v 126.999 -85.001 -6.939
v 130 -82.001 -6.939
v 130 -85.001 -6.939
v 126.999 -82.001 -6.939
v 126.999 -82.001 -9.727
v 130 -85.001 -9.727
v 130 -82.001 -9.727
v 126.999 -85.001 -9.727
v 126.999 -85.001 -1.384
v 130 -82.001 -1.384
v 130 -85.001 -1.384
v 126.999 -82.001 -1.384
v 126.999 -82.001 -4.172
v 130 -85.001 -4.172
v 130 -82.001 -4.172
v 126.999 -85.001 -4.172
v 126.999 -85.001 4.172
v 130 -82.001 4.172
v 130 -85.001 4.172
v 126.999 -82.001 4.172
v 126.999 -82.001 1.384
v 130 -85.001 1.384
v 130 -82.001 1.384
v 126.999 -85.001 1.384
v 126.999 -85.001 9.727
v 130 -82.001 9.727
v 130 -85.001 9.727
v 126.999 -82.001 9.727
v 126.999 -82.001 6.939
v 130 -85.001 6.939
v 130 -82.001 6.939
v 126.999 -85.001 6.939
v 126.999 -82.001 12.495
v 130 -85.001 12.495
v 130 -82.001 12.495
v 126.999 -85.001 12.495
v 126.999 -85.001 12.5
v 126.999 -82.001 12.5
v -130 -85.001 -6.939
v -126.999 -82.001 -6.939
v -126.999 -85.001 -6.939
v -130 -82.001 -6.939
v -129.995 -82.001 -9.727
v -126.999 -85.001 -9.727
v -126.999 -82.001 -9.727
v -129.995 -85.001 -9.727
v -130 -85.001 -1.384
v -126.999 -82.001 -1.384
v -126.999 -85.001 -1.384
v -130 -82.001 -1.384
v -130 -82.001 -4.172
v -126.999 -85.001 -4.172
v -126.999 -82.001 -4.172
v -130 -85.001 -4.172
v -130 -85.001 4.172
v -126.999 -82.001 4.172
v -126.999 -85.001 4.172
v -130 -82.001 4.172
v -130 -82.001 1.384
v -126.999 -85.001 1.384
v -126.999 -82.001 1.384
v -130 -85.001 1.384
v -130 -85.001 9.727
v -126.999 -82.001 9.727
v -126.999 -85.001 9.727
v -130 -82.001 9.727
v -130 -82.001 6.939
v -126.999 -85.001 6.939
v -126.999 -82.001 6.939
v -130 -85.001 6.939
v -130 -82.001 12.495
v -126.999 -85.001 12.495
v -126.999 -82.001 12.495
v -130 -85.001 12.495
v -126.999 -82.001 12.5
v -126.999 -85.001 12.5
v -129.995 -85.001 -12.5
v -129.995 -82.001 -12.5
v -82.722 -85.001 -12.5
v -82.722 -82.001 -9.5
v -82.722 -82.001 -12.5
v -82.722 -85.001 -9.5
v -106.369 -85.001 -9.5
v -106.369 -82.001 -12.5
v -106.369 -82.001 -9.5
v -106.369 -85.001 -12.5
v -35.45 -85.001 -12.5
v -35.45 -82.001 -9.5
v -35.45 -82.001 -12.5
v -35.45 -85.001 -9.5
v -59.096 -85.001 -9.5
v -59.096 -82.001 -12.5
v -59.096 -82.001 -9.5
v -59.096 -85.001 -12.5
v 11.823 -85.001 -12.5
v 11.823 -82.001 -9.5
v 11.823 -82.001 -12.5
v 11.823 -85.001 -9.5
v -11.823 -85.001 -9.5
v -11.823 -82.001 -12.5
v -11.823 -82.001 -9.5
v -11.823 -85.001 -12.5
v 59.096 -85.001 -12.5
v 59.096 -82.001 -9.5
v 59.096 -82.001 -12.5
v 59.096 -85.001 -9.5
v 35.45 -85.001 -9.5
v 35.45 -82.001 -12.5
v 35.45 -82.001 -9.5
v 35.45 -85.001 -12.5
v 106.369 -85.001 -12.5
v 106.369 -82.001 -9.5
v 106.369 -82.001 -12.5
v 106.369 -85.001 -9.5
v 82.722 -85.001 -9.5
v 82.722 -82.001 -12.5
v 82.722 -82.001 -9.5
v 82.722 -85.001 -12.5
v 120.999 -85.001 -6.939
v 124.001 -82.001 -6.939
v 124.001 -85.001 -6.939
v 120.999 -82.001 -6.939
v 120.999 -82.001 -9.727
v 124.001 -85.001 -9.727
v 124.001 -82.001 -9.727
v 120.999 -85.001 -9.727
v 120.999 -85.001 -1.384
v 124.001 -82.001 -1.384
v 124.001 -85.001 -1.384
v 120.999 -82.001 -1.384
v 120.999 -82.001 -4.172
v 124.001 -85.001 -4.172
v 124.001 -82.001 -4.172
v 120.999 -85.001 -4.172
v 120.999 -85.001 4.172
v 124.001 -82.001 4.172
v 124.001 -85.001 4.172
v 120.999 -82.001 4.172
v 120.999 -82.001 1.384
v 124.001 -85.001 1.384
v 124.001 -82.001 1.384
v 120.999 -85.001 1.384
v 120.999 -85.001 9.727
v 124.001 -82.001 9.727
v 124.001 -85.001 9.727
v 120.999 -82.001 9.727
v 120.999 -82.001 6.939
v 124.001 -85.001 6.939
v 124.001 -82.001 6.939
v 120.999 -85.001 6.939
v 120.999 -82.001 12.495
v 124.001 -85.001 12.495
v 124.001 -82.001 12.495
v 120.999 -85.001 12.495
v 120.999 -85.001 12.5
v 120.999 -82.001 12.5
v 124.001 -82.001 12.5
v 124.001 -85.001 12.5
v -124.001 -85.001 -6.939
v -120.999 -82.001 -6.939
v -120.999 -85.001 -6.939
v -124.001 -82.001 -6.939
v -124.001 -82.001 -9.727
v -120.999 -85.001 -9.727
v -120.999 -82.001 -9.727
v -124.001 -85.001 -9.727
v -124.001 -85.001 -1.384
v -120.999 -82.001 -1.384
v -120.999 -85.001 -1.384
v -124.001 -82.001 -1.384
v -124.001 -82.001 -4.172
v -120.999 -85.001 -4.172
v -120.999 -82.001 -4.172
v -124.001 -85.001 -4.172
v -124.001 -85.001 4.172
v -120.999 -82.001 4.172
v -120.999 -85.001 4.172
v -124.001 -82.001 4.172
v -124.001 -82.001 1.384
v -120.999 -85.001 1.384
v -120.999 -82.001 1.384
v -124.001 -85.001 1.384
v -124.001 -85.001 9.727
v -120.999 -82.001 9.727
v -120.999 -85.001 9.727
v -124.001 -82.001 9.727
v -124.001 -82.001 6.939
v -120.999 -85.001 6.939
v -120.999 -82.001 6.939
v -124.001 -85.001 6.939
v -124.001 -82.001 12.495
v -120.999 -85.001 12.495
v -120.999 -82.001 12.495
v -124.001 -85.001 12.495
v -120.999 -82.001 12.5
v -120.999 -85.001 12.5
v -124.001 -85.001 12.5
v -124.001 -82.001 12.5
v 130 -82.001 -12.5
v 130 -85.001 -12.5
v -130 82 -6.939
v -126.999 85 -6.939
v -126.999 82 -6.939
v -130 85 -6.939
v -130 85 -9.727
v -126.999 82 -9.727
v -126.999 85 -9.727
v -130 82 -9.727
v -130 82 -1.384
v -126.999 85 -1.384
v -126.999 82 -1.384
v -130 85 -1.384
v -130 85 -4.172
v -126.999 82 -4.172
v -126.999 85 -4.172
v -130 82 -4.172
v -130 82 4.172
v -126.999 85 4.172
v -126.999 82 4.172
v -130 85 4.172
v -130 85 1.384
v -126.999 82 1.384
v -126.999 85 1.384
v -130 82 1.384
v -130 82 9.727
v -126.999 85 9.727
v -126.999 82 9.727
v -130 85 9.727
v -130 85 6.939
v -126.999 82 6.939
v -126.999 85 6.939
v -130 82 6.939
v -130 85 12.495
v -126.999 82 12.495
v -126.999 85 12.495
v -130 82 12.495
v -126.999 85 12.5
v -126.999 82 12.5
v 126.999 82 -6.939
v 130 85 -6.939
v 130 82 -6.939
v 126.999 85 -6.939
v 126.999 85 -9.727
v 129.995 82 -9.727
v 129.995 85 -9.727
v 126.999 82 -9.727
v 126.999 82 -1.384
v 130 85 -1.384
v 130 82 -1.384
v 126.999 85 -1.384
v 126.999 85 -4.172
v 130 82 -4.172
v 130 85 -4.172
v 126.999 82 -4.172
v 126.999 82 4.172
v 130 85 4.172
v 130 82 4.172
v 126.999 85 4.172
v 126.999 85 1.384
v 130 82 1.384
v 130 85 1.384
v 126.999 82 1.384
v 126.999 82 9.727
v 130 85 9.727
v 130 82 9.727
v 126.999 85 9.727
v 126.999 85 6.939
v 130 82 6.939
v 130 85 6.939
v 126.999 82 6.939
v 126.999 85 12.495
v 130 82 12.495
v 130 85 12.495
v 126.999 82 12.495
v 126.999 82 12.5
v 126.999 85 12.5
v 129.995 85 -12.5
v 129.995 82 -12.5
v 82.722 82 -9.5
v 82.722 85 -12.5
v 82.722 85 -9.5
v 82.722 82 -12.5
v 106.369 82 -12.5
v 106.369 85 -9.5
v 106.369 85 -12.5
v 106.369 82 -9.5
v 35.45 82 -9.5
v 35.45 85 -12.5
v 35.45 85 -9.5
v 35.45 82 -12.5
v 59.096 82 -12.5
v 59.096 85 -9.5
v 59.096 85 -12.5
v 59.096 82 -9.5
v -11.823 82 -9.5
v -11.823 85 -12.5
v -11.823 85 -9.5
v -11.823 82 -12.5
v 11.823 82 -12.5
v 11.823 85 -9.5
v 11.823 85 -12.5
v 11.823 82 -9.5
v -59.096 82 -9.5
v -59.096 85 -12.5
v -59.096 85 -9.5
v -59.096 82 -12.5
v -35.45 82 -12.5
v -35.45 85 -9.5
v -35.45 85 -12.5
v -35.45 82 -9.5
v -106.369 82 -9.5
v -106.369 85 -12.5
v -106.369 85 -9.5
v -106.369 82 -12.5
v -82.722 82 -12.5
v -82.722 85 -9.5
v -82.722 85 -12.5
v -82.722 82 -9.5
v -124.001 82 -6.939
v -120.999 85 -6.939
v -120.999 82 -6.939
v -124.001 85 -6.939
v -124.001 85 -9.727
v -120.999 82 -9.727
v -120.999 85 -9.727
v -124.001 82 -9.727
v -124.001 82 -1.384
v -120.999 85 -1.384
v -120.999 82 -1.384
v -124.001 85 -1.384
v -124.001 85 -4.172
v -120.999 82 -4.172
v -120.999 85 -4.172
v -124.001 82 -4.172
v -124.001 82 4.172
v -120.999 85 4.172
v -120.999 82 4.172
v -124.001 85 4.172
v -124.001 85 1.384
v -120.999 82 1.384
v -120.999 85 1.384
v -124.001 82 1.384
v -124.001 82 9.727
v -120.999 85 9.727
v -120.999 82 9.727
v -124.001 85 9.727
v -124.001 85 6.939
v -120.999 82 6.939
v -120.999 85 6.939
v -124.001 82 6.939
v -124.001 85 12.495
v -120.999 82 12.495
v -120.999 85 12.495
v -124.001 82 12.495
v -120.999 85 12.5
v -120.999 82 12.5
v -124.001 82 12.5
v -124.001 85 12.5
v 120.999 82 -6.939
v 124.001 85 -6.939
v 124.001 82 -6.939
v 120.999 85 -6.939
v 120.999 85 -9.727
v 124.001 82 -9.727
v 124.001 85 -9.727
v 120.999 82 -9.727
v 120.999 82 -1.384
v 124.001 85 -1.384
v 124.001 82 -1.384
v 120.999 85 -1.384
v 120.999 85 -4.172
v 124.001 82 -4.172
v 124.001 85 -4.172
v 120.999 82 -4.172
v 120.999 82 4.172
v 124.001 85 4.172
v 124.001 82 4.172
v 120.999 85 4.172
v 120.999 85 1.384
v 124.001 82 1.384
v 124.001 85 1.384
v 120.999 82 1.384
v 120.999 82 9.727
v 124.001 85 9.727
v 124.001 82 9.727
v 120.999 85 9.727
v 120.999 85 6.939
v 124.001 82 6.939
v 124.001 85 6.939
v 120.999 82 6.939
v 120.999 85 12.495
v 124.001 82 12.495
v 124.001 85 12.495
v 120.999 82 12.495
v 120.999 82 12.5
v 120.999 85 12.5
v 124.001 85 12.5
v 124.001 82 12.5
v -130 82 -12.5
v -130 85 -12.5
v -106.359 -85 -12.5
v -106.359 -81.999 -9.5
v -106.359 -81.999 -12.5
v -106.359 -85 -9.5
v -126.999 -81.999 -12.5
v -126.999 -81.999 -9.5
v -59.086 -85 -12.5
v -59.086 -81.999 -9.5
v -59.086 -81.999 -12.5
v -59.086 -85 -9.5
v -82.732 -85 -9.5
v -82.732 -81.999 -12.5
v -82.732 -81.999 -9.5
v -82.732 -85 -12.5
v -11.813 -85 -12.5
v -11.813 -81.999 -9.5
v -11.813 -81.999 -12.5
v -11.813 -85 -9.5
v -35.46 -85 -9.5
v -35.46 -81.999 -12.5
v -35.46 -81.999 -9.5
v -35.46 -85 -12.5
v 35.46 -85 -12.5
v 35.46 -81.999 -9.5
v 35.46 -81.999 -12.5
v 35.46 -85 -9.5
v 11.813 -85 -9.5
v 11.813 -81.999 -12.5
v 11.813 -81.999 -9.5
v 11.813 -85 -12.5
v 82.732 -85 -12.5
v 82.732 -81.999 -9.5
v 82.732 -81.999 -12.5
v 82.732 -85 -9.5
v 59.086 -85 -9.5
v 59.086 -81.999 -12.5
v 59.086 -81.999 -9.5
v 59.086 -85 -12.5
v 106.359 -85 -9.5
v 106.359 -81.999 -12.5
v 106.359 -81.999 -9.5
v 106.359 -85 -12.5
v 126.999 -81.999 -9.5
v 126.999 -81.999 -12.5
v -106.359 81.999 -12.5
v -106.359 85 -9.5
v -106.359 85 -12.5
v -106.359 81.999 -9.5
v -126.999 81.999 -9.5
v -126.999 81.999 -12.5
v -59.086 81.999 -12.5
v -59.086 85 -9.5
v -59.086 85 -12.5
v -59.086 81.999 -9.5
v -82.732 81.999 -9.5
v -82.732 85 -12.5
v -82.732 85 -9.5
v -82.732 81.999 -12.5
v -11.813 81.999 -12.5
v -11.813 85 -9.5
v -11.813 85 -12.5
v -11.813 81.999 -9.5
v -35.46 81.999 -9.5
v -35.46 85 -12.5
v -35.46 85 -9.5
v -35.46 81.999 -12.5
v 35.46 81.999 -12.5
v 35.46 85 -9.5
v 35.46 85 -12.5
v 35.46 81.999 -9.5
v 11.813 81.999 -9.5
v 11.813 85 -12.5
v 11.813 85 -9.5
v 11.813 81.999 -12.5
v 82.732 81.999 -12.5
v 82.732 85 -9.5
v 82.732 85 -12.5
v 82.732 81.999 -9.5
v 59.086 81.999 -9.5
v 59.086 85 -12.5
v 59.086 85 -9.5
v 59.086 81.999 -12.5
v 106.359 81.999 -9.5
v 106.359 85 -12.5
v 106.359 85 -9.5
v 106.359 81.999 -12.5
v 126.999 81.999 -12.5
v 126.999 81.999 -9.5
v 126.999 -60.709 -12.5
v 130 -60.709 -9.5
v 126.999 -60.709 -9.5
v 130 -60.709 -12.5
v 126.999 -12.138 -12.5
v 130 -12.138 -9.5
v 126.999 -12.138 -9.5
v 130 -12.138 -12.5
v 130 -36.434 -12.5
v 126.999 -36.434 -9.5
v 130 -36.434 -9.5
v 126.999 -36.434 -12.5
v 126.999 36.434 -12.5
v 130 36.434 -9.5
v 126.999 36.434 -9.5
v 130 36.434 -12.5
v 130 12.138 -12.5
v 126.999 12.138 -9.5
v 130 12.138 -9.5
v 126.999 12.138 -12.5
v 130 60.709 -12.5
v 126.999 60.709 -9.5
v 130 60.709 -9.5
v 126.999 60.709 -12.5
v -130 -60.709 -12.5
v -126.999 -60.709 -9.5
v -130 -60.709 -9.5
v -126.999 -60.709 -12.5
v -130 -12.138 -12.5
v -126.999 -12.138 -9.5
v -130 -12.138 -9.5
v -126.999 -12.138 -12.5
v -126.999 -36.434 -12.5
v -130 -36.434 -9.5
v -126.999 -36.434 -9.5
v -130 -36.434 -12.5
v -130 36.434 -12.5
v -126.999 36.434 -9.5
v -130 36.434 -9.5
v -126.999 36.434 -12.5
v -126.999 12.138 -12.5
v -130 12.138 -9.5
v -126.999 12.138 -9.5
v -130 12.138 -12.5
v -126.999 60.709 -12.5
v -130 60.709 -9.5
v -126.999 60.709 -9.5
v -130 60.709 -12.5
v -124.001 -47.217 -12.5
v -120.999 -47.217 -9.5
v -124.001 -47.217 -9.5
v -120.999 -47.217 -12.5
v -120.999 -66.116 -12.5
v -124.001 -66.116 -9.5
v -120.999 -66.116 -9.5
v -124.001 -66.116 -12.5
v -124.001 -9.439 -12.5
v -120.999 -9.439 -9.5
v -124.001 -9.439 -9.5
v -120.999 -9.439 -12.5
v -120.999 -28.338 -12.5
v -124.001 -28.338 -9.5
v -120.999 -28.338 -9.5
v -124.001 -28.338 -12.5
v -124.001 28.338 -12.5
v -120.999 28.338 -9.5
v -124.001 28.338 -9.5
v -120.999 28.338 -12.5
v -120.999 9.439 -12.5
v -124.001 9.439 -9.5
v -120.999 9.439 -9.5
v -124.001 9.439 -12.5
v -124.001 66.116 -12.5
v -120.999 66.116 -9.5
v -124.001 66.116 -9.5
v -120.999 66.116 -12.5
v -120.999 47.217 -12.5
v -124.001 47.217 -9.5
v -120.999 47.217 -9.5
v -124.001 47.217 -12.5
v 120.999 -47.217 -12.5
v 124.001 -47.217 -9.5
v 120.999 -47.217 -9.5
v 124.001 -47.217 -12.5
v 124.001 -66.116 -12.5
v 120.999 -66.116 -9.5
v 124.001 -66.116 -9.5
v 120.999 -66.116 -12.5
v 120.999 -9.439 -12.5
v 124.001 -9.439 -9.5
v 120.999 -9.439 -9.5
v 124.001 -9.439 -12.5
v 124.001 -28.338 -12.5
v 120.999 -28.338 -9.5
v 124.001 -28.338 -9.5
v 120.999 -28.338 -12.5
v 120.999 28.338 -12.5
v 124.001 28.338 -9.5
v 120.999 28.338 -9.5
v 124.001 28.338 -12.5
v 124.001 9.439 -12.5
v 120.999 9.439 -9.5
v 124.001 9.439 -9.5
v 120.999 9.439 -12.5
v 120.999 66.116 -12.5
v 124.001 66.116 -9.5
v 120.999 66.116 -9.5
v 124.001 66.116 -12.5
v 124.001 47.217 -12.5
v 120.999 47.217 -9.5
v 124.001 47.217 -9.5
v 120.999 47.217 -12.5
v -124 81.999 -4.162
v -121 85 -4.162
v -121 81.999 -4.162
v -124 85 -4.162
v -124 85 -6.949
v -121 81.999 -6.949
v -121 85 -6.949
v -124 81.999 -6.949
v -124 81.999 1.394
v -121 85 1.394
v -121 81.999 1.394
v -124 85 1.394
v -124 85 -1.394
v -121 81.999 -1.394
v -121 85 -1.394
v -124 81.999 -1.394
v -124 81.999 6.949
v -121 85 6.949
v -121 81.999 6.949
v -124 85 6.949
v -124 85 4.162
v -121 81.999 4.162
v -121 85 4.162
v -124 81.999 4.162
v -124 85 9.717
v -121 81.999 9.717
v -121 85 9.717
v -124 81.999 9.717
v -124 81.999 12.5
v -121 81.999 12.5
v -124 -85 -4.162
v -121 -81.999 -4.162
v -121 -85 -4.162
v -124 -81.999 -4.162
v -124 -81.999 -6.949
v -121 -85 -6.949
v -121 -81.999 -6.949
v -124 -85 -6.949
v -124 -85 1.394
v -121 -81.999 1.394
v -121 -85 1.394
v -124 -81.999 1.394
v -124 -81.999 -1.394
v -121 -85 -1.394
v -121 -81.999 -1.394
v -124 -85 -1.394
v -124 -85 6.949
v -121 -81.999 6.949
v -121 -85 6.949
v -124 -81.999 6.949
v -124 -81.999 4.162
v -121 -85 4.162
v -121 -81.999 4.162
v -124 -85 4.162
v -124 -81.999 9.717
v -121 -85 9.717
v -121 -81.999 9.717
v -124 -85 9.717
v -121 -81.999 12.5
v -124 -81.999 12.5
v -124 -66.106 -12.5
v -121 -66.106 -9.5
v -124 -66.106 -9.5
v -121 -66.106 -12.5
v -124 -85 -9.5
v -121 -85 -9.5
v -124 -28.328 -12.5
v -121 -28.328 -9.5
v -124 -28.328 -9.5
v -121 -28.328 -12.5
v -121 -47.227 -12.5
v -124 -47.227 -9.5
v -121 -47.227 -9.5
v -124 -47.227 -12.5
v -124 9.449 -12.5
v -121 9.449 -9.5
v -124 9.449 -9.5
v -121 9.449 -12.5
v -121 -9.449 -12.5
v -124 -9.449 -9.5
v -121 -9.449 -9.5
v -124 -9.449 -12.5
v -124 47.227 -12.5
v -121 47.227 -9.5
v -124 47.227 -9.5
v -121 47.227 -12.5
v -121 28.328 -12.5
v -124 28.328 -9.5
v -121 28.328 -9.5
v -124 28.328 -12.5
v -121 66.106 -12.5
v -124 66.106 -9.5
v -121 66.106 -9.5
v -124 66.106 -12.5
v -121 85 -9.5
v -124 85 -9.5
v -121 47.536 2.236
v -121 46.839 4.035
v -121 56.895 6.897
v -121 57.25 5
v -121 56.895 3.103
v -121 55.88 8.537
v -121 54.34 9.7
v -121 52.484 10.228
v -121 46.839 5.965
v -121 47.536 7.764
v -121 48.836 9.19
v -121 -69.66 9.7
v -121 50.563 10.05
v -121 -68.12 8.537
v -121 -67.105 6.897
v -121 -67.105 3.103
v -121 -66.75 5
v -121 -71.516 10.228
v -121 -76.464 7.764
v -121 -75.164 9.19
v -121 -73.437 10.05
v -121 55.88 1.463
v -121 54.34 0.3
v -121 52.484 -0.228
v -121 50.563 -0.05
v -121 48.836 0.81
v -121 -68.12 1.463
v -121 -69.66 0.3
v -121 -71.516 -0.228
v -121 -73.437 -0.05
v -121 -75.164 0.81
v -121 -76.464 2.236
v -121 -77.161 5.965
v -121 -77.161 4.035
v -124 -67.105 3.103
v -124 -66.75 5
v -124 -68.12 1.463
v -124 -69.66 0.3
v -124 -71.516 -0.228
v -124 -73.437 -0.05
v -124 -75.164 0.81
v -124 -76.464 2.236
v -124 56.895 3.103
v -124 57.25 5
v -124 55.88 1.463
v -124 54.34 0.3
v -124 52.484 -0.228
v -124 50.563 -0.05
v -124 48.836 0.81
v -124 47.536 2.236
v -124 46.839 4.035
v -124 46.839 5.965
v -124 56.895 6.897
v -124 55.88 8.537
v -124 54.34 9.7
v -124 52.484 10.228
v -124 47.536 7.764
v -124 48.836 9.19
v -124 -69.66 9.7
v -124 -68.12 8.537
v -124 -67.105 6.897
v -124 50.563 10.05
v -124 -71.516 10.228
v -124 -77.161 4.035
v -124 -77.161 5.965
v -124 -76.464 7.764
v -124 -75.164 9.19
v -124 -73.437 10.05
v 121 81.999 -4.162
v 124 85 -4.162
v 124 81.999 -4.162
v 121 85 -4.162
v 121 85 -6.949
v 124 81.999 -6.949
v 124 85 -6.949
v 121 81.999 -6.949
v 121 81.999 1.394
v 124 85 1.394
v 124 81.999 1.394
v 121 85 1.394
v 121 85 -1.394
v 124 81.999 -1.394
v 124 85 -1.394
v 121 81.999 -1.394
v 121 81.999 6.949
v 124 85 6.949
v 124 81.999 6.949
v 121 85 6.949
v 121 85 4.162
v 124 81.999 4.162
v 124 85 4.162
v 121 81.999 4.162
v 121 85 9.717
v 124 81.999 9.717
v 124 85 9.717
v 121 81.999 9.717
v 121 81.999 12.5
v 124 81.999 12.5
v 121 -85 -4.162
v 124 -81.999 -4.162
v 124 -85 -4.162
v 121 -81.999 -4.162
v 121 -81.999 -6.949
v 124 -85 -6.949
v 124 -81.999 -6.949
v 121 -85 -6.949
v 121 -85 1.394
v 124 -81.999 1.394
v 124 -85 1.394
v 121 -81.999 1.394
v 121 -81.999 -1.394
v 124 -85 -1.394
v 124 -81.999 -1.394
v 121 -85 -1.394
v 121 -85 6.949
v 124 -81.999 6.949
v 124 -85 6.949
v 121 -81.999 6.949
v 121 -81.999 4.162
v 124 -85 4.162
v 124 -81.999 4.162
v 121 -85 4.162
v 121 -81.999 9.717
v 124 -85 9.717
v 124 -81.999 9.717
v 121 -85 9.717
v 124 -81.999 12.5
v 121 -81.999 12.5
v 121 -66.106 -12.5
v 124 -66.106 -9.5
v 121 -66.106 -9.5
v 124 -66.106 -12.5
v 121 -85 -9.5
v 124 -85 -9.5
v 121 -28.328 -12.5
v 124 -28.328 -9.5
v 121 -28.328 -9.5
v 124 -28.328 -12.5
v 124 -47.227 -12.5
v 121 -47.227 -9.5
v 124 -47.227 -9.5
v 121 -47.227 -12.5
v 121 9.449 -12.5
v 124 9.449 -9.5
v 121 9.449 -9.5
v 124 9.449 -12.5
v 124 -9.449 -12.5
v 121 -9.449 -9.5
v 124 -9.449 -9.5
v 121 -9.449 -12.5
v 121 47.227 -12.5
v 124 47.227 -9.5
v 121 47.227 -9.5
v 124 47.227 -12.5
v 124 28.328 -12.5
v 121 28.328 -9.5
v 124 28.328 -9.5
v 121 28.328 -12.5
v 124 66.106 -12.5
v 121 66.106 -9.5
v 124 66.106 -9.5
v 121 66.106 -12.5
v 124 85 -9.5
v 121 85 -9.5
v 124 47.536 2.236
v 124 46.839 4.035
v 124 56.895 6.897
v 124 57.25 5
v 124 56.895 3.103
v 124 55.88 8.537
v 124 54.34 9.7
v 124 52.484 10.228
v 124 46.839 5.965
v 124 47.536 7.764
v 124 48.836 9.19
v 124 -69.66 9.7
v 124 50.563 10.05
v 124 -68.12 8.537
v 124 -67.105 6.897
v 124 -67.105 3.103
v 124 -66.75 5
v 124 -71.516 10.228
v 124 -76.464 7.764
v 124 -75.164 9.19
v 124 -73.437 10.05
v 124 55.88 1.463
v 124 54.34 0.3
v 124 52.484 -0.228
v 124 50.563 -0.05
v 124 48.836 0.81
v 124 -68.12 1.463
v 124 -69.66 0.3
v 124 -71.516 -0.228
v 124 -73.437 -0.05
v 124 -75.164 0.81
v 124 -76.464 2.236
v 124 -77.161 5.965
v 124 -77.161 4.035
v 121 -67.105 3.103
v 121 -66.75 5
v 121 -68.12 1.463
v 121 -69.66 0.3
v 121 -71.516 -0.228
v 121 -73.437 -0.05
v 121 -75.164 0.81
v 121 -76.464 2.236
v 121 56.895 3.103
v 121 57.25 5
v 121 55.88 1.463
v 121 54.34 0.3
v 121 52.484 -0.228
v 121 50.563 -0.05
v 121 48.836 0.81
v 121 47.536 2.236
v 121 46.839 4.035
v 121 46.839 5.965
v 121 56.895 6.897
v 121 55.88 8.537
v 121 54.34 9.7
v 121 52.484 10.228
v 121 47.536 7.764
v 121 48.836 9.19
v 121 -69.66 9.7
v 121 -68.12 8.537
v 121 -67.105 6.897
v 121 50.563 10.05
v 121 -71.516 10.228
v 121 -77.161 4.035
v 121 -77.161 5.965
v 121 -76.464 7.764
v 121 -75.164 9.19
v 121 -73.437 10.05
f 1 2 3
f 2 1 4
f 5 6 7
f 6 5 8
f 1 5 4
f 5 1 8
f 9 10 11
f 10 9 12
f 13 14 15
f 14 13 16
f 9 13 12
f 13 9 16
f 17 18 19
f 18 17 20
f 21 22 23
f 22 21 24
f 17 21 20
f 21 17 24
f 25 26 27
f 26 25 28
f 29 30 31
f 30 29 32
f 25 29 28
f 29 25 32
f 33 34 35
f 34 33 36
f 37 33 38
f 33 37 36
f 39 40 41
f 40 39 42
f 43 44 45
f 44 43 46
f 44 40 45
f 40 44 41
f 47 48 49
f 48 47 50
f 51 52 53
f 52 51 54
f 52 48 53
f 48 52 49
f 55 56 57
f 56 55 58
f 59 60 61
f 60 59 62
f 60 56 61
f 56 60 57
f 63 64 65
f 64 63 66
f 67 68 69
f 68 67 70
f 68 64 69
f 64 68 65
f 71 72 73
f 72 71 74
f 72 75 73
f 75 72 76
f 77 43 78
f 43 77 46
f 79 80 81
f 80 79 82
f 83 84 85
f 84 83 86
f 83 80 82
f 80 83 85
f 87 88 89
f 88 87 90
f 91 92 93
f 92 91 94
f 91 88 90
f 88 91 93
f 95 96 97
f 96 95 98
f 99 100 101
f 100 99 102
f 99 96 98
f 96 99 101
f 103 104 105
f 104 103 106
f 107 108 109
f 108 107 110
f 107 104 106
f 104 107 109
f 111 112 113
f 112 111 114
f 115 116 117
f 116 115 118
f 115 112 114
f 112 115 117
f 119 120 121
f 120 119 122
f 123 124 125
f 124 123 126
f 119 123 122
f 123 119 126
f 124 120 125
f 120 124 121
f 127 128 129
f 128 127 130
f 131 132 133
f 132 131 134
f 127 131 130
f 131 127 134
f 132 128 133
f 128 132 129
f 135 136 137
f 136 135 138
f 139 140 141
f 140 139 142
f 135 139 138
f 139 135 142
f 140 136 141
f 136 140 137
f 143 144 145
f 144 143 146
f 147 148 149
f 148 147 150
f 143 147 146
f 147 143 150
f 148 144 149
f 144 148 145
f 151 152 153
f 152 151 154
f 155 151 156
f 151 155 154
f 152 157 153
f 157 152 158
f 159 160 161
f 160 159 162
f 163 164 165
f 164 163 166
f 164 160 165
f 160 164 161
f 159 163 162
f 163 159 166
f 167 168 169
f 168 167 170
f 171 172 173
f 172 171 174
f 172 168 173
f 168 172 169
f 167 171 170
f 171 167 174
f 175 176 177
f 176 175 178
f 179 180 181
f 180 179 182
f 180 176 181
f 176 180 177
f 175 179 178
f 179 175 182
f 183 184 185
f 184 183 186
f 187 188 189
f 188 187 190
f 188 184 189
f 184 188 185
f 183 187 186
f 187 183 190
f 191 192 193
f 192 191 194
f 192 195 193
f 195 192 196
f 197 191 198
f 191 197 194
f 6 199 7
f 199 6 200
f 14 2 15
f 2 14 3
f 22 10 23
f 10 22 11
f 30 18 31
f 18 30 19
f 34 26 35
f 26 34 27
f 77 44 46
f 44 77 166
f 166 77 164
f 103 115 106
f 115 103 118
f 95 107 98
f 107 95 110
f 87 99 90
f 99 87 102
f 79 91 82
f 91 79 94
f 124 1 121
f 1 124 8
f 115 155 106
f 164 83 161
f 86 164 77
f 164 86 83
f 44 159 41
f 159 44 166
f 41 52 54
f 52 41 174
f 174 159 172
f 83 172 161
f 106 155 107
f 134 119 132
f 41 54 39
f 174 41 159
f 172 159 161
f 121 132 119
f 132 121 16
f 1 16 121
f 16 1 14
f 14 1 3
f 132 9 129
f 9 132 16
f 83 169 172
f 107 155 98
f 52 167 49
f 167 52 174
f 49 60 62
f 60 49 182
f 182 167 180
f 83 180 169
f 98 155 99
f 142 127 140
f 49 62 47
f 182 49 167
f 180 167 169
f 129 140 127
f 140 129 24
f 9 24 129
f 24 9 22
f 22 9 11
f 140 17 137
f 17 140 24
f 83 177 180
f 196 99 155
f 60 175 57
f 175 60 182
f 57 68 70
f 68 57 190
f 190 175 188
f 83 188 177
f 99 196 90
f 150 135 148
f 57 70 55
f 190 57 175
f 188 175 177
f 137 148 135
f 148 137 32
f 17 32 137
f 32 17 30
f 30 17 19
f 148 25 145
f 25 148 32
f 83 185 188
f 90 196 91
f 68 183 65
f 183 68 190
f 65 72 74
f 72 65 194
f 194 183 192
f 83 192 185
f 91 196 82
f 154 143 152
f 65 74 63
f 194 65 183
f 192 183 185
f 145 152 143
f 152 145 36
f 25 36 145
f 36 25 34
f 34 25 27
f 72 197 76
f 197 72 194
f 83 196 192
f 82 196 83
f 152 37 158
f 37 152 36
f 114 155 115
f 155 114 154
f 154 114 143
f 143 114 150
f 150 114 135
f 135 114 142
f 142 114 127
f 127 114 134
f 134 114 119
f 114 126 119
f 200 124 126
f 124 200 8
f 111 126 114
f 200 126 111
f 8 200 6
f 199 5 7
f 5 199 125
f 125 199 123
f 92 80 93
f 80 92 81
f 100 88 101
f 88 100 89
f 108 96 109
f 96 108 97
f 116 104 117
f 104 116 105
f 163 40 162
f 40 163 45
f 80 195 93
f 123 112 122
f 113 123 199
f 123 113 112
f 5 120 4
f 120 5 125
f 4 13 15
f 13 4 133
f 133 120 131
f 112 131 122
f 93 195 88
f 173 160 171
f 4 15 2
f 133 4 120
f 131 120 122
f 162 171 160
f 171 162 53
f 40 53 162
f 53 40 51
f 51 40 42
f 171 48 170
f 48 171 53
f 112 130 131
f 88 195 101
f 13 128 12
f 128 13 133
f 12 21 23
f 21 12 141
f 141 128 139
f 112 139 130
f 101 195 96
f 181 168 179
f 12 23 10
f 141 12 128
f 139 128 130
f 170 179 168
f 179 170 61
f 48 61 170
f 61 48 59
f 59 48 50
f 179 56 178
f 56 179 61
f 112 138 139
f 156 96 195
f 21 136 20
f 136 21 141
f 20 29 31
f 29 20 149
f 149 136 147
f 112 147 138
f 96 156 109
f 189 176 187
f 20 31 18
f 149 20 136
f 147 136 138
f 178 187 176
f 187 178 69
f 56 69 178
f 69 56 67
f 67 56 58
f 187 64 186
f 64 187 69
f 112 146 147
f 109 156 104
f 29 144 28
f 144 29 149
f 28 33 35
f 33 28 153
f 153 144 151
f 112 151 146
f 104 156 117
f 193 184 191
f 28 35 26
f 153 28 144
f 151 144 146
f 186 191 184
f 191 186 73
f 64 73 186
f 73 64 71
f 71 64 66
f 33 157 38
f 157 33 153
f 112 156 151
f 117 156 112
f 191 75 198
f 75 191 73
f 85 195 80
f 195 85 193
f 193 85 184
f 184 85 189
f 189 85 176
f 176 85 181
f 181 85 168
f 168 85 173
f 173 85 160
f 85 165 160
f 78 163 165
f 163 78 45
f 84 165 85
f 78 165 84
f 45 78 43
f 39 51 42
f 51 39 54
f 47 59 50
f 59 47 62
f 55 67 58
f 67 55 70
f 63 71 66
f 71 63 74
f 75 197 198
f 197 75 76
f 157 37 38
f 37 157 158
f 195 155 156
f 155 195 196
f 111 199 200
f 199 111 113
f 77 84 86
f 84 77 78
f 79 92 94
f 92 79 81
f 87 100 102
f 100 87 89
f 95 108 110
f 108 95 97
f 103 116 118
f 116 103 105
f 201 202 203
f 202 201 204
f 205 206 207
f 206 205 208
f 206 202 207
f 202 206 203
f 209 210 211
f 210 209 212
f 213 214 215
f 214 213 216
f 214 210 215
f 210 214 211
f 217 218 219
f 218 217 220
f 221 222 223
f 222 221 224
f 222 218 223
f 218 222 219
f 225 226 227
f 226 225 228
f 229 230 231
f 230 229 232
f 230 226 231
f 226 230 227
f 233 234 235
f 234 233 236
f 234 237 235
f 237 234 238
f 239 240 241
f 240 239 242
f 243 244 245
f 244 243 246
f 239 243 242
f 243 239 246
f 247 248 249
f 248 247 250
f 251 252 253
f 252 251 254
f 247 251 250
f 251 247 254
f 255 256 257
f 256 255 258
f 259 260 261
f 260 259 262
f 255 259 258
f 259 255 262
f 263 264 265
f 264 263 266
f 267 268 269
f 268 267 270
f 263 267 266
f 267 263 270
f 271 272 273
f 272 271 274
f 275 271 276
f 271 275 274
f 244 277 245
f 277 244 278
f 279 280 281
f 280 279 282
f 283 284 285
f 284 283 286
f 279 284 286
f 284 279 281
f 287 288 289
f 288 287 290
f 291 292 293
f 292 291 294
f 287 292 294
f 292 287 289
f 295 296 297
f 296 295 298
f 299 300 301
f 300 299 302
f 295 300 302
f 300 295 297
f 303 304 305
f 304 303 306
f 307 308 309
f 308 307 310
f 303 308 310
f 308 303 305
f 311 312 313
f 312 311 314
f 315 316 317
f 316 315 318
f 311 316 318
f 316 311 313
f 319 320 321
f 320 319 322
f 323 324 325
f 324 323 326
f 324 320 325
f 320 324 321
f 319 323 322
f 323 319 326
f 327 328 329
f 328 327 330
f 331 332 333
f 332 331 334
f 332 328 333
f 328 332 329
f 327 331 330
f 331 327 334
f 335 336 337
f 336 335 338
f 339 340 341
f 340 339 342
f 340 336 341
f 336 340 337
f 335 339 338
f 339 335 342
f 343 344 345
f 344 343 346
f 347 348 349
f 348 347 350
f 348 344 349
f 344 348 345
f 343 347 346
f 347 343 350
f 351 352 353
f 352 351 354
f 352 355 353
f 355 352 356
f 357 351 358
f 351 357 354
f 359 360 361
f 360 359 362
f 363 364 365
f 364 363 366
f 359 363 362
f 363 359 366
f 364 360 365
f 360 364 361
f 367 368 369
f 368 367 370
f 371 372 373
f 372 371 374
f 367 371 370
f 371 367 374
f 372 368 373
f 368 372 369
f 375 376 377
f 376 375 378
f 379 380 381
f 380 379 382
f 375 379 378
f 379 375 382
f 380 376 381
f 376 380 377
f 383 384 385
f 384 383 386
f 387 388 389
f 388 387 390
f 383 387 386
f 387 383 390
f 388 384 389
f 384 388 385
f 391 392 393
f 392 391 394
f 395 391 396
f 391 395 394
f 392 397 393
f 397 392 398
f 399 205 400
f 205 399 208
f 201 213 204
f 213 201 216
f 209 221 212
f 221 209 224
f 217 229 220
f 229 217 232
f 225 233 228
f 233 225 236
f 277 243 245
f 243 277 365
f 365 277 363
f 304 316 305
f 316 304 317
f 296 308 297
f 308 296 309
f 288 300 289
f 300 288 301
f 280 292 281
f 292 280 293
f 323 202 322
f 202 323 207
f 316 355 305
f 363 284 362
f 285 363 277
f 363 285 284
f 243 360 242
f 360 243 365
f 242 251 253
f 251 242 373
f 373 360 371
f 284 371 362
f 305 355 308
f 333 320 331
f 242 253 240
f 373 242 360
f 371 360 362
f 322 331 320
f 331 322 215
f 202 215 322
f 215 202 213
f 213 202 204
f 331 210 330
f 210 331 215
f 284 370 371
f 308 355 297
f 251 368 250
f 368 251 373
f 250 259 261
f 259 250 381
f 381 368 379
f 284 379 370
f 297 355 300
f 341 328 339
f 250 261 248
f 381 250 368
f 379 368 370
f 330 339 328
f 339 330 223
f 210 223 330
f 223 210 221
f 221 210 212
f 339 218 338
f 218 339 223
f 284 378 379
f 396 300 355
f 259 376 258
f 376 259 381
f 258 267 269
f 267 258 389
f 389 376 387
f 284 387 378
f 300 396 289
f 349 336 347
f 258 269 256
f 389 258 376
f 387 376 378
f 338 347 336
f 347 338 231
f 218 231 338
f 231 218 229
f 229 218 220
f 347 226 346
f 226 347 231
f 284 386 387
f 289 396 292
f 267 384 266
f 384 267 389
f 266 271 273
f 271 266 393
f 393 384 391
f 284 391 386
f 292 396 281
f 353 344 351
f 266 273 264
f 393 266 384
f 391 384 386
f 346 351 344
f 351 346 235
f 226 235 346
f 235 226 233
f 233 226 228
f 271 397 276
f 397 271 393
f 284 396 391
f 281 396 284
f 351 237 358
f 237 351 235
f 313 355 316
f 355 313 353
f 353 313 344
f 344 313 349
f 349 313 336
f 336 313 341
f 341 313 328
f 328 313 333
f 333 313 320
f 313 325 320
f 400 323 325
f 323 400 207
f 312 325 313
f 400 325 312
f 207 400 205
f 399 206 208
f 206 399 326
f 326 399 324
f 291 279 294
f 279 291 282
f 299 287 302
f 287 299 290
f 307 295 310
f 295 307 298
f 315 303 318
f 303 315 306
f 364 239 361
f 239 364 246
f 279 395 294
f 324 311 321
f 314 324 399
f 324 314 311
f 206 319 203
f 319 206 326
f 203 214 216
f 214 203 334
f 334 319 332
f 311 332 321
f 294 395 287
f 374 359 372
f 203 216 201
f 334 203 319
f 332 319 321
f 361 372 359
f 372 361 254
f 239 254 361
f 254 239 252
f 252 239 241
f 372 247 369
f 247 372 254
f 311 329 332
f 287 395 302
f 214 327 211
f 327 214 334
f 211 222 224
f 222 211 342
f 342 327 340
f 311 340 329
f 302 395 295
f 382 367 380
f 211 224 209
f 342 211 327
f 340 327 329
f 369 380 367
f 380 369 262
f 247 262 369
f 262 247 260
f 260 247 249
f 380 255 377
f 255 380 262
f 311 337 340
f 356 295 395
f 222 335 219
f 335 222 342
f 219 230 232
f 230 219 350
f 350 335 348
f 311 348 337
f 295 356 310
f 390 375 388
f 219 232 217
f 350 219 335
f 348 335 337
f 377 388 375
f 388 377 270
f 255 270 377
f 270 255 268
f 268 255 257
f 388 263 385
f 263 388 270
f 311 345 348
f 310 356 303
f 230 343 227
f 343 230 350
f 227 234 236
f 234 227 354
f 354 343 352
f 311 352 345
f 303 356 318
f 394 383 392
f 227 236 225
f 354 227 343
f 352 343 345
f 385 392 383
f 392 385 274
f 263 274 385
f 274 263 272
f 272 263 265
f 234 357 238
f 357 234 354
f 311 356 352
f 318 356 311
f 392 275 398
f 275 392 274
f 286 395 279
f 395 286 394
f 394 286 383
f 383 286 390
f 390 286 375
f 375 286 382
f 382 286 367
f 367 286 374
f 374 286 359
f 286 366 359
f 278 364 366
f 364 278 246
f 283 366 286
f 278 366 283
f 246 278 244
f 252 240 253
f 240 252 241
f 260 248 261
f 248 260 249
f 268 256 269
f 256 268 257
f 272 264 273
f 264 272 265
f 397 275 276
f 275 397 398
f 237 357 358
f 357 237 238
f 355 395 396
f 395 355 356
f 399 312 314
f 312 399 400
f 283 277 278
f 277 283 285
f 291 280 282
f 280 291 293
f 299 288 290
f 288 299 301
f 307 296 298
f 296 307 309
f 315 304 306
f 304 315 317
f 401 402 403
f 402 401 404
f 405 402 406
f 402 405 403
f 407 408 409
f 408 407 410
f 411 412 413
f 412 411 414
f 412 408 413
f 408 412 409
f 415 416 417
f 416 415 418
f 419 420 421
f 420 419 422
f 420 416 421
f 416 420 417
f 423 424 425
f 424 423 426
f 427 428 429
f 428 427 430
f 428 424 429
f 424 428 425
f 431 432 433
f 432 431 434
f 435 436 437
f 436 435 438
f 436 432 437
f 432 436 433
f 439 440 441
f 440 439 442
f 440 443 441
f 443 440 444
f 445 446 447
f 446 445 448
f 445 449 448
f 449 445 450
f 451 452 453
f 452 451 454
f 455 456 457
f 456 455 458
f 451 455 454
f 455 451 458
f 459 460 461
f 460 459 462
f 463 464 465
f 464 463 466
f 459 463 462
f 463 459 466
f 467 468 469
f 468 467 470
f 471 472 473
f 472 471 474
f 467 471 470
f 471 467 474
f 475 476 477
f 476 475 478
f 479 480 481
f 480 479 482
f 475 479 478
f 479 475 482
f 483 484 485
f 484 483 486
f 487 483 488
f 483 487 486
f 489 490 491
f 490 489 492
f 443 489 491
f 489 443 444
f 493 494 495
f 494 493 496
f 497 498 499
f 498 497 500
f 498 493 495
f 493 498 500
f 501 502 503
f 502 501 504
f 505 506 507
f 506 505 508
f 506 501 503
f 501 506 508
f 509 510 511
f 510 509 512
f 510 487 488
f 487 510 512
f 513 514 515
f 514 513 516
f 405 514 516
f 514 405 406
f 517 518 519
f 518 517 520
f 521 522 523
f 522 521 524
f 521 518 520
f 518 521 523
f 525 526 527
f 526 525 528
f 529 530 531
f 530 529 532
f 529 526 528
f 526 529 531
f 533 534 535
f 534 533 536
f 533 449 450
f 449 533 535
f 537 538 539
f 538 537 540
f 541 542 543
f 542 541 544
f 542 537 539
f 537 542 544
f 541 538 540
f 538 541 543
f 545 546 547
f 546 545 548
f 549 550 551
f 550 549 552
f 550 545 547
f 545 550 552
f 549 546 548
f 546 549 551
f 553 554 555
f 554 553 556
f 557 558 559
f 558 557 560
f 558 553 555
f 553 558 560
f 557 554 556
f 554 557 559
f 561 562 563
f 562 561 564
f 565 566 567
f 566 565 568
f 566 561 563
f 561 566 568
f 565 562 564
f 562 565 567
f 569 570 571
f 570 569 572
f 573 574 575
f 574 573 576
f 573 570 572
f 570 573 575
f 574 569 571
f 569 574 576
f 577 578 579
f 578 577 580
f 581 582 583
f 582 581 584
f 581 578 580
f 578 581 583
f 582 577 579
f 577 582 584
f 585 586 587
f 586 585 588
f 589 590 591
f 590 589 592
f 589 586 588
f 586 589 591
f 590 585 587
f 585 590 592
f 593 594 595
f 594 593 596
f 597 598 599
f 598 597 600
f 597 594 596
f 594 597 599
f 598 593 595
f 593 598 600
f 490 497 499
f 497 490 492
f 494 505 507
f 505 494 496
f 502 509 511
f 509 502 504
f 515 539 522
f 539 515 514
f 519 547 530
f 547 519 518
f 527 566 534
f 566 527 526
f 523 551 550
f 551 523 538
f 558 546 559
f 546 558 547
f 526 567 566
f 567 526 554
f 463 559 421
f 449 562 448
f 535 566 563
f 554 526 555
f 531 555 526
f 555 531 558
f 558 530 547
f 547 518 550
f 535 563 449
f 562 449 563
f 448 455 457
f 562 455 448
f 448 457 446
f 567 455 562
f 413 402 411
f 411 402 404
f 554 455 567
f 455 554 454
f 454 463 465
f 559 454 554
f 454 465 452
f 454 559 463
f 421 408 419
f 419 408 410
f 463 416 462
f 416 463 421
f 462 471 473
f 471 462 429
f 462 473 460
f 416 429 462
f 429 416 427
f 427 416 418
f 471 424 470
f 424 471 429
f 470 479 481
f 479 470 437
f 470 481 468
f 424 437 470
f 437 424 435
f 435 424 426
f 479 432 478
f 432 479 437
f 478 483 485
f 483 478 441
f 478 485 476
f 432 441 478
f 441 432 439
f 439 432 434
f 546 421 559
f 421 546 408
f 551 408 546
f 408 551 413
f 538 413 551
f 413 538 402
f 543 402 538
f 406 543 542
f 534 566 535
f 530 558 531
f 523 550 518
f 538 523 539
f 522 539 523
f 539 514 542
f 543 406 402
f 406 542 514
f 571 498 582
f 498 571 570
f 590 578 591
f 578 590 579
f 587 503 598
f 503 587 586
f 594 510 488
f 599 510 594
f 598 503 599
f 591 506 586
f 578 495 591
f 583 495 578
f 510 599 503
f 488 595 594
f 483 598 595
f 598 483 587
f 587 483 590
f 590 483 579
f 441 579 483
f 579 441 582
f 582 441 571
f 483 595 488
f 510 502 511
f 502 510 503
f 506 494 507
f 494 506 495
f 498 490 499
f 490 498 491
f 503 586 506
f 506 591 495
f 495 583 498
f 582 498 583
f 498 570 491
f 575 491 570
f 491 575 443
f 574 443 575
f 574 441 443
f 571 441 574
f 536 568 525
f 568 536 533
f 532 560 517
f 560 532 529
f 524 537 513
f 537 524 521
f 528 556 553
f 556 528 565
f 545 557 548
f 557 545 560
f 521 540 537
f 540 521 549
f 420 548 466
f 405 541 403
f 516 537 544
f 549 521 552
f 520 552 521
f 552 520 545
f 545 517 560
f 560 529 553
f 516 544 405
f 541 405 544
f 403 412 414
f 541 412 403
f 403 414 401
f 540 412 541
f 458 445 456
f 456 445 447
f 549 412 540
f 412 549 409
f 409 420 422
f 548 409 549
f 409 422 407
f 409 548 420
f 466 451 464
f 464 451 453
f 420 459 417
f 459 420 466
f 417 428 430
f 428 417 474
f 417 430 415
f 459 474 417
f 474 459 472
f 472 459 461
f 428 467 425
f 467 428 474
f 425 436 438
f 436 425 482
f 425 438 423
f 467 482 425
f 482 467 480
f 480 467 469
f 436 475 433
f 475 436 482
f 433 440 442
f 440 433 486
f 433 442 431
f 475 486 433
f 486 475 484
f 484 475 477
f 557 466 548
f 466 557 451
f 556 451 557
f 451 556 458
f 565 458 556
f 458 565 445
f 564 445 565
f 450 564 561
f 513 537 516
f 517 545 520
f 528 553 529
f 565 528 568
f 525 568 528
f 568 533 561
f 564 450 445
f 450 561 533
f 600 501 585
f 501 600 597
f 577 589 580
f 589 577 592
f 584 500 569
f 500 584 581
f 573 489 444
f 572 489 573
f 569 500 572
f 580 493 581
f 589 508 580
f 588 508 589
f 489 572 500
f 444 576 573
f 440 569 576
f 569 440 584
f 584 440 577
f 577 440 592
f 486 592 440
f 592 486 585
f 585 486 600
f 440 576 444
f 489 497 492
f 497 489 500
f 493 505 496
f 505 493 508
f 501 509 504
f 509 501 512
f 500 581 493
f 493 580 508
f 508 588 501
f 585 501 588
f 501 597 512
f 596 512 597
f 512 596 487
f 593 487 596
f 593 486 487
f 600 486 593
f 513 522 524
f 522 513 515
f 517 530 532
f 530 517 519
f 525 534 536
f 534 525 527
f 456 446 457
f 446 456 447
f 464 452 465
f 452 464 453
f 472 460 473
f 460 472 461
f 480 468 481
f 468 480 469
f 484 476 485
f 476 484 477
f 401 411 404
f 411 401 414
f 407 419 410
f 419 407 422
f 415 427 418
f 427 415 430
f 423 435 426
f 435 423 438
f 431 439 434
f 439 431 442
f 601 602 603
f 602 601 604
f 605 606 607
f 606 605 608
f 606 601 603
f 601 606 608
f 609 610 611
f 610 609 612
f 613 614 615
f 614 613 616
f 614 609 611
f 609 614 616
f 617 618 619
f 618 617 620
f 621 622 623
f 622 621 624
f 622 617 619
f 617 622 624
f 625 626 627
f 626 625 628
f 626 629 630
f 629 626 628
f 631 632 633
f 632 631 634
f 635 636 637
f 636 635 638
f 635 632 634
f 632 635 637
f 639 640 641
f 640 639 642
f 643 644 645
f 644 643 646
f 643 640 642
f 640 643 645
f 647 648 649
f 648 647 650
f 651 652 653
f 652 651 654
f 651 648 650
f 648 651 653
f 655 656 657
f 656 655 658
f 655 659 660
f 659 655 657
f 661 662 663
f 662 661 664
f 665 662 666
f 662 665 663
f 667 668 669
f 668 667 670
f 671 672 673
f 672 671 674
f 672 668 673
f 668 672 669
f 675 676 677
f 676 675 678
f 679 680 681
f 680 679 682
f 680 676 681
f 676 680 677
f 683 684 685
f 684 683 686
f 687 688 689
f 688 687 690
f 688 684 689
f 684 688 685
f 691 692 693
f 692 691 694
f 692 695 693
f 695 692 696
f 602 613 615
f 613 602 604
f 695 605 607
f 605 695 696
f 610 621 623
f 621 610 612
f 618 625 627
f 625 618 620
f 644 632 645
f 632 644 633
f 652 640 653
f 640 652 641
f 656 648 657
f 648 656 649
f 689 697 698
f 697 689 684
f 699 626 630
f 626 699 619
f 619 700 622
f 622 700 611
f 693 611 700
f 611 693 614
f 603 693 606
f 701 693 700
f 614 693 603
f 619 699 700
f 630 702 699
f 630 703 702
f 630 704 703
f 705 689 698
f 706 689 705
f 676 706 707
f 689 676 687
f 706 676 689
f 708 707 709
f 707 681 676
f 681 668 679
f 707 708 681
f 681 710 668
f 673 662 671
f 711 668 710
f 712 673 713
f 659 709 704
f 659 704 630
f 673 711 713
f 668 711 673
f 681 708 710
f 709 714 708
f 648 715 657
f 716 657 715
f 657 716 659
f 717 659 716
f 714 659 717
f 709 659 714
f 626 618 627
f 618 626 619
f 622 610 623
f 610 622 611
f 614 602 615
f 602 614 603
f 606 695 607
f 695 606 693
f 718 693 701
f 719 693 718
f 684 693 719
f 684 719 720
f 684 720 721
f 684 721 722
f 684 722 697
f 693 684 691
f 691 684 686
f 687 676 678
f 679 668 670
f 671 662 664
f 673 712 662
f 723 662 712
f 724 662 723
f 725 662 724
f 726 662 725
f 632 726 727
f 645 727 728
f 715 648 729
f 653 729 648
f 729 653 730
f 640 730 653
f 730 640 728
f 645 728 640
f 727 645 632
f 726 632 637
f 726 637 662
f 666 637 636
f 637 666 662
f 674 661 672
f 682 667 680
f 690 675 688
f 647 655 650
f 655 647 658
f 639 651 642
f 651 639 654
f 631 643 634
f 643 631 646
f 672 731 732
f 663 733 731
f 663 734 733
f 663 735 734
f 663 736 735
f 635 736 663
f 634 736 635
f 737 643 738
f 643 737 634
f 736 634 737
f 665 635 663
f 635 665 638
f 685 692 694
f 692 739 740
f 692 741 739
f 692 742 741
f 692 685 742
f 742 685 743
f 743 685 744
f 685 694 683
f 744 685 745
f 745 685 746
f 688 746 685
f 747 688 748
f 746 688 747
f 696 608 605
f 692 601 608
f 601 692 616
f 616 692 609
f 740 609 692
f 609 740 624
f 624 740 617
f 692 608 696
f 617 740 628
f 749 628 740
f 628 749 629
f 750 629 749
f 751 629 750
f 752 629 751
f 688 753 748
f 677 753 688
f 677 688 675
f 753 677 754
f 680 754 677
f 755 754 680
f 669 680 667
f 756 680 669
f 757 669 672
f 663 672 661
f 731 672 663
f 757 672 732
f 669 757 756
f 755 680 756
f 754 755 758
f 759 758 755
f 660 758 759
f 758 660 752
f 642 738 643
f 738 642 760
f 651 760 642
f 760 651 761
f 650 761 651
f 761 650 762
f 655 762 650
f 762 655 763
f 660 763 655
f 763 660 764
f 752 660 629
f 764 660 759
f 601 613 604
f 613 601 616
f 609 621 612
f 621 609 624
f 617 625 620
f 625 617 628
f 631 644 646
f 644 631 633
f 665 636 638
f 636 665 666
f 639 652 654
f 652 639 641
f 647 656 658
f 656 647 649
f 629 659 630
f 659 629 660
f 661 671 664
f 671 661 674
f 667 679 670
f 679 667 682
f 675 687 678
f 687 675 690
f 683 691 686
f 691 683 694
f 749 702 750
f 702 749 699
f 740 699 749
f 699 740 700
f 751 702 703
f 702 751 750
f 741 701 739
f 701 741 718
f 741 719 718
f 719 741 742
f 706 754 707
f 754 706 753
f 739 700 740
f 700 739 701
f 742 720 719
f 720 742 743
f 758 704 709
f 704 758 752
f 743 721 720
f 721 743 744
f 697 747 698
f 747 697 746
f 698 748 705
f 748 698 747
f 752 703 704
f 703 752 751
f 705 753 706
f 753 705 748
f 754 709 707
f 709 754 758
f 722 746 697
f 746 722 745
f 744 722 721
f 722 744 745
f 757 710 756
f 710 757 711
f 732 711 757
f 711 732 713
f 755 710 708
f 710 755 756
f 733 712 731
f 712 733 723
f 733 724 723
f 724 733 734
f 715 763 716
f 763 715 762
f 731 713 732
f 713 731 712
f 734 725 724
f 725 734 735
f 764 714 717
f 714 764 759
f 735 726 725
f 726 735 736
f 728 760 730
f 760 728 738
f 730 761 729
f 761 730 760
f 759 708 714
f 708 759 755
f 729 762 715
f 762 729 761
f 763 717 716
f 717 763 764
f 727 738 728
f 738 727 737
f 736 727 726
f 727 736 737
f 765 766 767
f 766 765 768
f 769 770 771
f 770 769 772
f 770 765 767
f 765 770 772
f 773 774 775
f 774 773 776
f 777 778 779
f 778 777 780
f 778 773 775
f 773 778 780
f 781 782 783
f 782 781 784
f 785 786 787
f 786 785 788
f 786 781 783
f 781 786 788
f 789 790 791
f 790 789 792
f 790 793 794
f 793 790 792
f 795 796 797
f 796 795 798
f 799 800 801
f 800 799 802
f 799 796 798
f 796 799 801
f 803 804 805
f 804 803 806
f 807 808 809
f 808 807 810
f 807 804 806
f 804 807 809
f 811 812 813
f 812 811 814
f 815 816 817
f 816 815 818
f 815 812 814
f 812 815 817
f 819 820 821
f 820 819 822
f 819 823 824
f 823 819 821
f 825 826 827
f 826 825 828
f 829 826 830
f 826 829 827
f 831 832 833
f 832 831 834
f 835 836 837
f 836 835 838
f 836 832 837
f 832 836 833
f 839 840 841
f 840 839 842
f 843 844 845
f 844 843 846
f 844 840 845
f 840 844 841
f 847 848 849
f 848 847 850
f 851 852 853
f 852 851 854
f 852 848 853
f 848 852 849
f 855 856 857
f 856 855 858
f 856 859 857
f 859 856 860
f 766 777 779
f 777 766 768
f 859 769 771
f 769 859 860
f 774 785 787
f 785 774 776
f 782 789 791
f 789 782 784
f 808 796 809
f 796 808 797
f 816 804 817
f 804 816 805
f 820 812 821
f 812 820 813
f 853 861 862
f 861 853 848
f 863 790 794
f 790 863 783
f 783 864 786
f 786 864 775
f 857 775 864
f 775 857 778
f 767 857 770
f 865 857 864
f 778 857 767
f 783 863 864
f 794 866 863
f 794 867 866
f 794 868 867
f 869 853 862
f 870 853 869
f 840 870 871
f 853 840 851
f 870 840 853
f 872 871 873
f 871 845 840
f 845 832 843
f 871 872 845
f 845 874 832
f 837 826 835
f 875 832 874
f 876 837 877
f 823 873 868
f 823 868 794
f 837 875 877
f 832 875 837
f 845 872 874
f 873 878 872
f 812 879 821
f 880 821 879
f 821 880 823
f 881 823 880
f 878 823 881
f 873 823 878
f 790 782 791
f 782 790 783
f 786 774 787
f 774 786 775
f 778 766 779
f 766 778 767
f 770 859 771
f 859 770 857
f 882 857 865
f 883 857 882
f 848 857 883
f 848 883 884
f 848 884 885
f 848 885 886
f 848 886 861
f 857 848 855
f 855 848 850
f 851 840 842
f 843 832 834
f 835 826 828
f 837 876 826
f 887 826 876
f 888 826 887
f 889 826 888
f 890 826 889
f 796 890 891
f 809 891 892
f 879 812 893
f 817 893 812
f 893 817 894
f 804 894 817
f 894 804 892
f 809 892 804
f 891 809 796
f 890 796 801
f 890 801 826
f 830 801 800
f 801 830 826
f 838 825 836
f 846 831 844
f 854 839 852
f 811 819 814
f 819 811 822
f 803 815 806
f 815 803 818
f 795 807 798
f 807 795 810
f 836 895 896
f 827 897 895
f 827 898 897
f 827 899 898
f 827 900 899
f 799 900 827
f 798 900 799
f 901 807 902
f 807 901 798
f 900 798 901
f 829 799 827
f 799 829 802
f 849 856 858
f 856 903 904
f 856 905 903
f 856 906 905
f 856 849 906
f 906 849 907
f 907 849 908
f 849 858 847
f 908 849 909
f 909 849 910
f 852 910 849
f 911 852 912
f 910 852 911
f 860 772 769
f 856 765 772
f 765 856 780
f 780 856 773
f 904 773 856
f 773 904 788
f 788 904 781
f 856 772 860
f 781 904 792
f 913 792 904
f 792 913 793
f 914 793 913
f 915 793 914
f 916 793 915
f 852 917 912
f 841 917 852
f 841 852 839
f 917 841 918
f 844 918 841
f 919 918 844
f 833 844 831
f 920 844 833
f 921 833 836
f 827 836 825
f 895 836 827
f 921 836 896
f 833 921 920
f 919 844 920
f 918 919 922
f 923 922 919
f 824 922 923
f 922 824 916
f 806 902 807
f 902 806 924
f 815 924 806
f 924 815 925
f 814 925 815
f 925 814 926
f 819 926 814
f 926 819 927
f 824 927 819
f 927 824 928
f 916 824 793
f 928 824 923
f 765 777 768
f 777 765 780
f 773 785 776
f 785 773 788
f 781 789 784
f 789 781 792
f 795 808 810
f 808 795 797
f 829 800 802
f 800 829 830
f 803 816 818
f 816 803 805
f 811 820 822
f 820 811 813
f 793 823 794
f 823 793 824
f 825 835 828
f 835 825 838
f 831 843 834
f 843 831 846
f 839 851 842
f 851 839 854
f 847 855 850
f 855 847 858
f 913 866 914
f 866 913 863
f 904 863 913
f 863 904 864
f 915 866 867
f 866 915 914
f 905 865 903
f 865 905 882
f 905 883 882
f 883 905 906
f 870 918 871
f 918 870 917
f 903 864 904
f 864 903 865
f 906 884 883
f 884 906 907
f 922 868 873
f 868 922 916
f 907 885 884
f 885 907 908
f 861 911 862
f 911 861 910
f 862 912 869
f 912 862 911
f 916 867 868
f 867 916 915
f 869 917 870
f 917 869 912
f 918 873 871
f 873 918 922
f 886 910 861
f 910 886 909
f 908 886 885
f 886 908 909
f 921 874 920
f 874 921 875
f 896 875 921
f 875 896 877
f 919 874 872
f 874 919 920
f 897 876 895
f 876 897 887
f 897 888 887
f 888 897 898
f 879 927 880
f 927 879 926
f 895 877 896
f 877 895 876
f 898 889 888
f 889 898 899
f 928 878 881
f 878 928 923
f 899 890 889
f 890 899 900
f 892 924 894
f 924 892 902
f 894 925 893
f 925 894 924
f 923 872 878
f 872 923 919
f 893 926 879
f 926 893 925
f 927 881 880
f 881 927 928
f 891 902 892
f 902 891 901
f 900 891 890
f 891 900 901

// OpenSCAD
// file: params.scad
// arguments
laser_beam_width=.005*25.4;
material_thickness=3;
// material_thickness=5.4;
echo("Material thickness: ", material_thickness);
h = 50;
w = 260;
d = 170;

lid_h = 25;

// calculated
bottom_h = h-lid_h;

strut_width=10;
strut_pivot_r=5;
strut_pivot_hole_r=5.1;

rear_strut_sagitta_ratio=3.5;
rear_strut_bottom_dx = d / 2 - material_thickness - strut_width - 2;
rear_strut_bottom_dy = 5;
rear_strut_top_dx = d / 2 - material_thickness - strut_width * 3;
rear_strut_top_dy = 5;
rear_strut_max_angle = 135;
// rear_strut_max_angle = 152.5;


rear_strut_delta_x = abs(rear_strut_bottom_dx - rear_strut_top_dx);
rear_strut_delta_y = abs((bottom_h / 2 - rear_strut_bottom_dy) + (lid_h / 2 + rear_strut_top_dy));
rear_strut_length = sqrt(pow(rear_strut_delta_x, 2) + pow(rear_strut_delta_y, 2));
rear_strut_init_angle = asin(rear_strut_delta_y / rear_strut_length);
// rear_strut_max_angle = rear_strut_init_angle;


front_strut_bottom_dx = d / 2 - material_thickness - strut_width * 3.5;
front_strut_bottom_dy = 5;
front_strut_top_dx = -(d / 2 - material_thickness - strut_width);
front_strut_top_dy = 5;

front_strut_delta_x = abs(front_strut_bottom_dx - front_strut_top_dx);
front_strut_delta_y = abs((bottom_h / 2 - front_strut_bottom_dy) + (lid_h / 2 + front_strut_top_dy));
front_strut_length = sqrt(pow(front_strut_delta_x, 2) + pow(front_strut_delta_y, 2));
front_strut_init_angle = asin(front_strut_delta_y / front_strut_length);
echo("expected front strut init angle:", front_strut_init_angle);

bottom_bar = abs(front_strut_bottom_dx - rear_strut_bottom_dx);
diagonal_len = sqrt(pow(rear_strut_length, 2) + pow(bottom_bar, 2) - 2*rear_strut_length*bottom_bar*cos(rear_strut_max_angle));

echo("Diagonal len:", diagonal_len);

top_bar = abs(front_strut_top_dx - rear_strut_top_dx);
theta_upper = acos(
  (pow(front_strut_length, 2) + pow(diagonal_len, 2) - pow(top_bar, 2))
  /(2*front_strut_length*diagonal_len)
);
x = 
  (pow(diagonal_len, 2) + pow(bottom_bar, 2) - pow(rear_strut_length, 2))
  /(2*diagonal_len*bottom_bar);
theta_lower = acos(min(max(x, -1), 1));
echo("theta_lower:", theta_lower);

front_strut_max_angle = theta_lower + theta_upper;
echo ("front_strut_max_angle", front_strut_max_angle);

lid_angle_top = acos((pow(top_bar, 2) + pow(diagonal_len, 2) - pow(front_strut_length, 2))/(2*top_bar*diagonal_len));
lid_angle_bottom = (180 - rear_strut_max_angle - theta_lower);
lid_angle = lid_angle_top + lid_angle_bottom;
echo("lid_angle:", lid_angle);
// main file
include <params.scad>

module sawtooth(tab_size, tab_spacing, num_tabs) {
  for (i=[0:num_tabs-1]) {
    translate([(i - floor(num_tabs/2)) * 2 * tab_size + (num_tabs % 2 == 1 ? tab_size : 0), 0, 0]) 
    cube(size=[tab_size + 0.01, material_thickness+0.001, material_thickness*2], center=true);
  }
}

module lid_front() {
  color([255/255, 0/255, 0/255]) {
    render() difference() {
      cube(size=[w, lid_h, material_thickness], center=true);
      for (a = [0, 180]) {
        rotate([0, a, 0]) {
          translate([w/2 - material_thickness/2, 0, 0]) {
            rotate([0, 0, 90]) sawtooth(bottom_h/9, 0, 5);
          }
        }
      }
      translate([0, -lid_h/2 + material_thickness/2, 0]) sawtooth(w/11, 0, 6);

      for (a = [0, 180]) {
        rotate([0, a, 0]) {
          translate([w/2 - material_thickness/2 - 2*material_thickness, 0, 0]) {
            rotate([0, 0, 90]) sawtooth(bottom_h/9, 0, 5);
          }
        }
      }
    }
  }
}

module lid_back() {
  color([255/255, 0/255, 0/255]) render() difference() {
    cube(size=[w, lid_h, material_thickness], center=true);
    for (a = [0, 180]) {
      rotate([0, a, 0]) {
        translate([w/2 - material_thickness/2, 0, 0]) {
          rotate([0, 0, 90]) sawtooth(bottom_h/9, 0, 5);
        }
      }
    }

    translate([0, -lid_h/2+material_thickness/2, 0]) sawtooth(w/11, 0, 6);
    
    for (a = [0, 180]) {
      rotate([0, a, 0]) {
        translate([w/2 - material_thickness/2 - 2*material_thickness, 0, 0]) {
          rotate([0, 0, 90]) sawtooth(bottom_h/9, 0, 5);
        }
      }
    }
    
  }
}

module lid_side() {
  color([0/255, 255/255, 0/255]) {
    render() difference() {
      cube(size=[d, lid_h, material_thickness], center=true);
      for (a = [0, 180]) {
        rotate([0, a, 0]) {
          translate([d/2 - material_thickness/2, 0, 0]) {
            rotate([0, 0, 90]) sawtooth(bottom_h/9, 0, 6);
          }
        }
      }

      translate([0, -lid_h/2 + material_thickness/2, 0]) sawtooth(d/7, 0, 4);
    }
  }
}

module lid_bottom() {
  color([0/255, 0/255, 255/255]) {
    render() difference() {
      cube(size=[w, d, material_thickness], center=true);
      translate([0, -d/2 + material_thickness/2, 0]) sawtooth(w/11, 0, 7);
      translate([0, d/2 - material_thickness/2, 0]) sawtooth(w/11, 0, 7);
      for (a = [0, 180]) rotate([0, a, 0]) {
        translate([w/2 - material_thickness/2, 0, 0]) rotate([0, 0, 90]) sawtooth(d/7, 0, 5);
      }
      
      for (a = [0, 180]) rotate([0, a, 0]) {
        translate([-w/2 + material_thickness/2 + 2*material_thickness, 0, 0]) rotate([0, 0, 90]) sawtooth(d/9, 0, 5);
      }
    }
  }
}

module lid_retainer() {
  color([125/255, 125/255, 0/255]) {
    render() difference () {
      cube(size=[d, lid_h, material_thickness], center=true);

      for (a = [0, 180]) {
        rotate([0, a, 0]) {
          translate([d/2 - material_thickness/2, 0, 0]) {
            rotate([0, 0, 90]) sawtooth(bottom_h/9, 0, 6);
          }
        }
      }

      translate([0, -lid_h/2 + material_thickness/2, 0]) sawtooth(d/9, 0, 6);

      translate([rear_strut_top_dx, rear_strut_top_dy, 0]) cylinder(r=5.25, h=material_thickness*2, center=true);
      translate([front_strut_top_dx, front_strut_top_dy, 0]) cylinder(r=5.25, h=material_thickness*2, center=true);
    }
  }
}

module complete_lid() {
  translate([0, -d/2 + material_thickness/2 - 0.001, 0]) rotate([90, 0, 0]) lid_front();
  translate([0, d/2 - material_thickness/2, 0]) rotate([0, 0, 180]) rotate([90, 0, 0]) lid_back();
  // translate([-w/2 + material_thickness/2, 0, 0]) rotate([0, 0, -90]) rotate([90, 0, 0]) lid_side();
  // translate([w/2 - material_thickness/2, 0, 0]) rotate([0, 0, 90]) rotate([90, 0, 0]) lid_side();
  translate([0, 0, -lid_h/2 + material_thickness/2]) lid_bottom();

  translate([-w/2 + material_thickness/2 + 2*material_thickness, 0, 0]) rotate([0, 0, 90]) rotate([90, 0, 0]) lid_retainer();
  translate([w/2 - material_thickness/2 - 2*material_thickness, 0, 0]) rotate([0, 0, -90]) rotate([90, 0, 180]) lid_retainer();
}

complete_lid();
